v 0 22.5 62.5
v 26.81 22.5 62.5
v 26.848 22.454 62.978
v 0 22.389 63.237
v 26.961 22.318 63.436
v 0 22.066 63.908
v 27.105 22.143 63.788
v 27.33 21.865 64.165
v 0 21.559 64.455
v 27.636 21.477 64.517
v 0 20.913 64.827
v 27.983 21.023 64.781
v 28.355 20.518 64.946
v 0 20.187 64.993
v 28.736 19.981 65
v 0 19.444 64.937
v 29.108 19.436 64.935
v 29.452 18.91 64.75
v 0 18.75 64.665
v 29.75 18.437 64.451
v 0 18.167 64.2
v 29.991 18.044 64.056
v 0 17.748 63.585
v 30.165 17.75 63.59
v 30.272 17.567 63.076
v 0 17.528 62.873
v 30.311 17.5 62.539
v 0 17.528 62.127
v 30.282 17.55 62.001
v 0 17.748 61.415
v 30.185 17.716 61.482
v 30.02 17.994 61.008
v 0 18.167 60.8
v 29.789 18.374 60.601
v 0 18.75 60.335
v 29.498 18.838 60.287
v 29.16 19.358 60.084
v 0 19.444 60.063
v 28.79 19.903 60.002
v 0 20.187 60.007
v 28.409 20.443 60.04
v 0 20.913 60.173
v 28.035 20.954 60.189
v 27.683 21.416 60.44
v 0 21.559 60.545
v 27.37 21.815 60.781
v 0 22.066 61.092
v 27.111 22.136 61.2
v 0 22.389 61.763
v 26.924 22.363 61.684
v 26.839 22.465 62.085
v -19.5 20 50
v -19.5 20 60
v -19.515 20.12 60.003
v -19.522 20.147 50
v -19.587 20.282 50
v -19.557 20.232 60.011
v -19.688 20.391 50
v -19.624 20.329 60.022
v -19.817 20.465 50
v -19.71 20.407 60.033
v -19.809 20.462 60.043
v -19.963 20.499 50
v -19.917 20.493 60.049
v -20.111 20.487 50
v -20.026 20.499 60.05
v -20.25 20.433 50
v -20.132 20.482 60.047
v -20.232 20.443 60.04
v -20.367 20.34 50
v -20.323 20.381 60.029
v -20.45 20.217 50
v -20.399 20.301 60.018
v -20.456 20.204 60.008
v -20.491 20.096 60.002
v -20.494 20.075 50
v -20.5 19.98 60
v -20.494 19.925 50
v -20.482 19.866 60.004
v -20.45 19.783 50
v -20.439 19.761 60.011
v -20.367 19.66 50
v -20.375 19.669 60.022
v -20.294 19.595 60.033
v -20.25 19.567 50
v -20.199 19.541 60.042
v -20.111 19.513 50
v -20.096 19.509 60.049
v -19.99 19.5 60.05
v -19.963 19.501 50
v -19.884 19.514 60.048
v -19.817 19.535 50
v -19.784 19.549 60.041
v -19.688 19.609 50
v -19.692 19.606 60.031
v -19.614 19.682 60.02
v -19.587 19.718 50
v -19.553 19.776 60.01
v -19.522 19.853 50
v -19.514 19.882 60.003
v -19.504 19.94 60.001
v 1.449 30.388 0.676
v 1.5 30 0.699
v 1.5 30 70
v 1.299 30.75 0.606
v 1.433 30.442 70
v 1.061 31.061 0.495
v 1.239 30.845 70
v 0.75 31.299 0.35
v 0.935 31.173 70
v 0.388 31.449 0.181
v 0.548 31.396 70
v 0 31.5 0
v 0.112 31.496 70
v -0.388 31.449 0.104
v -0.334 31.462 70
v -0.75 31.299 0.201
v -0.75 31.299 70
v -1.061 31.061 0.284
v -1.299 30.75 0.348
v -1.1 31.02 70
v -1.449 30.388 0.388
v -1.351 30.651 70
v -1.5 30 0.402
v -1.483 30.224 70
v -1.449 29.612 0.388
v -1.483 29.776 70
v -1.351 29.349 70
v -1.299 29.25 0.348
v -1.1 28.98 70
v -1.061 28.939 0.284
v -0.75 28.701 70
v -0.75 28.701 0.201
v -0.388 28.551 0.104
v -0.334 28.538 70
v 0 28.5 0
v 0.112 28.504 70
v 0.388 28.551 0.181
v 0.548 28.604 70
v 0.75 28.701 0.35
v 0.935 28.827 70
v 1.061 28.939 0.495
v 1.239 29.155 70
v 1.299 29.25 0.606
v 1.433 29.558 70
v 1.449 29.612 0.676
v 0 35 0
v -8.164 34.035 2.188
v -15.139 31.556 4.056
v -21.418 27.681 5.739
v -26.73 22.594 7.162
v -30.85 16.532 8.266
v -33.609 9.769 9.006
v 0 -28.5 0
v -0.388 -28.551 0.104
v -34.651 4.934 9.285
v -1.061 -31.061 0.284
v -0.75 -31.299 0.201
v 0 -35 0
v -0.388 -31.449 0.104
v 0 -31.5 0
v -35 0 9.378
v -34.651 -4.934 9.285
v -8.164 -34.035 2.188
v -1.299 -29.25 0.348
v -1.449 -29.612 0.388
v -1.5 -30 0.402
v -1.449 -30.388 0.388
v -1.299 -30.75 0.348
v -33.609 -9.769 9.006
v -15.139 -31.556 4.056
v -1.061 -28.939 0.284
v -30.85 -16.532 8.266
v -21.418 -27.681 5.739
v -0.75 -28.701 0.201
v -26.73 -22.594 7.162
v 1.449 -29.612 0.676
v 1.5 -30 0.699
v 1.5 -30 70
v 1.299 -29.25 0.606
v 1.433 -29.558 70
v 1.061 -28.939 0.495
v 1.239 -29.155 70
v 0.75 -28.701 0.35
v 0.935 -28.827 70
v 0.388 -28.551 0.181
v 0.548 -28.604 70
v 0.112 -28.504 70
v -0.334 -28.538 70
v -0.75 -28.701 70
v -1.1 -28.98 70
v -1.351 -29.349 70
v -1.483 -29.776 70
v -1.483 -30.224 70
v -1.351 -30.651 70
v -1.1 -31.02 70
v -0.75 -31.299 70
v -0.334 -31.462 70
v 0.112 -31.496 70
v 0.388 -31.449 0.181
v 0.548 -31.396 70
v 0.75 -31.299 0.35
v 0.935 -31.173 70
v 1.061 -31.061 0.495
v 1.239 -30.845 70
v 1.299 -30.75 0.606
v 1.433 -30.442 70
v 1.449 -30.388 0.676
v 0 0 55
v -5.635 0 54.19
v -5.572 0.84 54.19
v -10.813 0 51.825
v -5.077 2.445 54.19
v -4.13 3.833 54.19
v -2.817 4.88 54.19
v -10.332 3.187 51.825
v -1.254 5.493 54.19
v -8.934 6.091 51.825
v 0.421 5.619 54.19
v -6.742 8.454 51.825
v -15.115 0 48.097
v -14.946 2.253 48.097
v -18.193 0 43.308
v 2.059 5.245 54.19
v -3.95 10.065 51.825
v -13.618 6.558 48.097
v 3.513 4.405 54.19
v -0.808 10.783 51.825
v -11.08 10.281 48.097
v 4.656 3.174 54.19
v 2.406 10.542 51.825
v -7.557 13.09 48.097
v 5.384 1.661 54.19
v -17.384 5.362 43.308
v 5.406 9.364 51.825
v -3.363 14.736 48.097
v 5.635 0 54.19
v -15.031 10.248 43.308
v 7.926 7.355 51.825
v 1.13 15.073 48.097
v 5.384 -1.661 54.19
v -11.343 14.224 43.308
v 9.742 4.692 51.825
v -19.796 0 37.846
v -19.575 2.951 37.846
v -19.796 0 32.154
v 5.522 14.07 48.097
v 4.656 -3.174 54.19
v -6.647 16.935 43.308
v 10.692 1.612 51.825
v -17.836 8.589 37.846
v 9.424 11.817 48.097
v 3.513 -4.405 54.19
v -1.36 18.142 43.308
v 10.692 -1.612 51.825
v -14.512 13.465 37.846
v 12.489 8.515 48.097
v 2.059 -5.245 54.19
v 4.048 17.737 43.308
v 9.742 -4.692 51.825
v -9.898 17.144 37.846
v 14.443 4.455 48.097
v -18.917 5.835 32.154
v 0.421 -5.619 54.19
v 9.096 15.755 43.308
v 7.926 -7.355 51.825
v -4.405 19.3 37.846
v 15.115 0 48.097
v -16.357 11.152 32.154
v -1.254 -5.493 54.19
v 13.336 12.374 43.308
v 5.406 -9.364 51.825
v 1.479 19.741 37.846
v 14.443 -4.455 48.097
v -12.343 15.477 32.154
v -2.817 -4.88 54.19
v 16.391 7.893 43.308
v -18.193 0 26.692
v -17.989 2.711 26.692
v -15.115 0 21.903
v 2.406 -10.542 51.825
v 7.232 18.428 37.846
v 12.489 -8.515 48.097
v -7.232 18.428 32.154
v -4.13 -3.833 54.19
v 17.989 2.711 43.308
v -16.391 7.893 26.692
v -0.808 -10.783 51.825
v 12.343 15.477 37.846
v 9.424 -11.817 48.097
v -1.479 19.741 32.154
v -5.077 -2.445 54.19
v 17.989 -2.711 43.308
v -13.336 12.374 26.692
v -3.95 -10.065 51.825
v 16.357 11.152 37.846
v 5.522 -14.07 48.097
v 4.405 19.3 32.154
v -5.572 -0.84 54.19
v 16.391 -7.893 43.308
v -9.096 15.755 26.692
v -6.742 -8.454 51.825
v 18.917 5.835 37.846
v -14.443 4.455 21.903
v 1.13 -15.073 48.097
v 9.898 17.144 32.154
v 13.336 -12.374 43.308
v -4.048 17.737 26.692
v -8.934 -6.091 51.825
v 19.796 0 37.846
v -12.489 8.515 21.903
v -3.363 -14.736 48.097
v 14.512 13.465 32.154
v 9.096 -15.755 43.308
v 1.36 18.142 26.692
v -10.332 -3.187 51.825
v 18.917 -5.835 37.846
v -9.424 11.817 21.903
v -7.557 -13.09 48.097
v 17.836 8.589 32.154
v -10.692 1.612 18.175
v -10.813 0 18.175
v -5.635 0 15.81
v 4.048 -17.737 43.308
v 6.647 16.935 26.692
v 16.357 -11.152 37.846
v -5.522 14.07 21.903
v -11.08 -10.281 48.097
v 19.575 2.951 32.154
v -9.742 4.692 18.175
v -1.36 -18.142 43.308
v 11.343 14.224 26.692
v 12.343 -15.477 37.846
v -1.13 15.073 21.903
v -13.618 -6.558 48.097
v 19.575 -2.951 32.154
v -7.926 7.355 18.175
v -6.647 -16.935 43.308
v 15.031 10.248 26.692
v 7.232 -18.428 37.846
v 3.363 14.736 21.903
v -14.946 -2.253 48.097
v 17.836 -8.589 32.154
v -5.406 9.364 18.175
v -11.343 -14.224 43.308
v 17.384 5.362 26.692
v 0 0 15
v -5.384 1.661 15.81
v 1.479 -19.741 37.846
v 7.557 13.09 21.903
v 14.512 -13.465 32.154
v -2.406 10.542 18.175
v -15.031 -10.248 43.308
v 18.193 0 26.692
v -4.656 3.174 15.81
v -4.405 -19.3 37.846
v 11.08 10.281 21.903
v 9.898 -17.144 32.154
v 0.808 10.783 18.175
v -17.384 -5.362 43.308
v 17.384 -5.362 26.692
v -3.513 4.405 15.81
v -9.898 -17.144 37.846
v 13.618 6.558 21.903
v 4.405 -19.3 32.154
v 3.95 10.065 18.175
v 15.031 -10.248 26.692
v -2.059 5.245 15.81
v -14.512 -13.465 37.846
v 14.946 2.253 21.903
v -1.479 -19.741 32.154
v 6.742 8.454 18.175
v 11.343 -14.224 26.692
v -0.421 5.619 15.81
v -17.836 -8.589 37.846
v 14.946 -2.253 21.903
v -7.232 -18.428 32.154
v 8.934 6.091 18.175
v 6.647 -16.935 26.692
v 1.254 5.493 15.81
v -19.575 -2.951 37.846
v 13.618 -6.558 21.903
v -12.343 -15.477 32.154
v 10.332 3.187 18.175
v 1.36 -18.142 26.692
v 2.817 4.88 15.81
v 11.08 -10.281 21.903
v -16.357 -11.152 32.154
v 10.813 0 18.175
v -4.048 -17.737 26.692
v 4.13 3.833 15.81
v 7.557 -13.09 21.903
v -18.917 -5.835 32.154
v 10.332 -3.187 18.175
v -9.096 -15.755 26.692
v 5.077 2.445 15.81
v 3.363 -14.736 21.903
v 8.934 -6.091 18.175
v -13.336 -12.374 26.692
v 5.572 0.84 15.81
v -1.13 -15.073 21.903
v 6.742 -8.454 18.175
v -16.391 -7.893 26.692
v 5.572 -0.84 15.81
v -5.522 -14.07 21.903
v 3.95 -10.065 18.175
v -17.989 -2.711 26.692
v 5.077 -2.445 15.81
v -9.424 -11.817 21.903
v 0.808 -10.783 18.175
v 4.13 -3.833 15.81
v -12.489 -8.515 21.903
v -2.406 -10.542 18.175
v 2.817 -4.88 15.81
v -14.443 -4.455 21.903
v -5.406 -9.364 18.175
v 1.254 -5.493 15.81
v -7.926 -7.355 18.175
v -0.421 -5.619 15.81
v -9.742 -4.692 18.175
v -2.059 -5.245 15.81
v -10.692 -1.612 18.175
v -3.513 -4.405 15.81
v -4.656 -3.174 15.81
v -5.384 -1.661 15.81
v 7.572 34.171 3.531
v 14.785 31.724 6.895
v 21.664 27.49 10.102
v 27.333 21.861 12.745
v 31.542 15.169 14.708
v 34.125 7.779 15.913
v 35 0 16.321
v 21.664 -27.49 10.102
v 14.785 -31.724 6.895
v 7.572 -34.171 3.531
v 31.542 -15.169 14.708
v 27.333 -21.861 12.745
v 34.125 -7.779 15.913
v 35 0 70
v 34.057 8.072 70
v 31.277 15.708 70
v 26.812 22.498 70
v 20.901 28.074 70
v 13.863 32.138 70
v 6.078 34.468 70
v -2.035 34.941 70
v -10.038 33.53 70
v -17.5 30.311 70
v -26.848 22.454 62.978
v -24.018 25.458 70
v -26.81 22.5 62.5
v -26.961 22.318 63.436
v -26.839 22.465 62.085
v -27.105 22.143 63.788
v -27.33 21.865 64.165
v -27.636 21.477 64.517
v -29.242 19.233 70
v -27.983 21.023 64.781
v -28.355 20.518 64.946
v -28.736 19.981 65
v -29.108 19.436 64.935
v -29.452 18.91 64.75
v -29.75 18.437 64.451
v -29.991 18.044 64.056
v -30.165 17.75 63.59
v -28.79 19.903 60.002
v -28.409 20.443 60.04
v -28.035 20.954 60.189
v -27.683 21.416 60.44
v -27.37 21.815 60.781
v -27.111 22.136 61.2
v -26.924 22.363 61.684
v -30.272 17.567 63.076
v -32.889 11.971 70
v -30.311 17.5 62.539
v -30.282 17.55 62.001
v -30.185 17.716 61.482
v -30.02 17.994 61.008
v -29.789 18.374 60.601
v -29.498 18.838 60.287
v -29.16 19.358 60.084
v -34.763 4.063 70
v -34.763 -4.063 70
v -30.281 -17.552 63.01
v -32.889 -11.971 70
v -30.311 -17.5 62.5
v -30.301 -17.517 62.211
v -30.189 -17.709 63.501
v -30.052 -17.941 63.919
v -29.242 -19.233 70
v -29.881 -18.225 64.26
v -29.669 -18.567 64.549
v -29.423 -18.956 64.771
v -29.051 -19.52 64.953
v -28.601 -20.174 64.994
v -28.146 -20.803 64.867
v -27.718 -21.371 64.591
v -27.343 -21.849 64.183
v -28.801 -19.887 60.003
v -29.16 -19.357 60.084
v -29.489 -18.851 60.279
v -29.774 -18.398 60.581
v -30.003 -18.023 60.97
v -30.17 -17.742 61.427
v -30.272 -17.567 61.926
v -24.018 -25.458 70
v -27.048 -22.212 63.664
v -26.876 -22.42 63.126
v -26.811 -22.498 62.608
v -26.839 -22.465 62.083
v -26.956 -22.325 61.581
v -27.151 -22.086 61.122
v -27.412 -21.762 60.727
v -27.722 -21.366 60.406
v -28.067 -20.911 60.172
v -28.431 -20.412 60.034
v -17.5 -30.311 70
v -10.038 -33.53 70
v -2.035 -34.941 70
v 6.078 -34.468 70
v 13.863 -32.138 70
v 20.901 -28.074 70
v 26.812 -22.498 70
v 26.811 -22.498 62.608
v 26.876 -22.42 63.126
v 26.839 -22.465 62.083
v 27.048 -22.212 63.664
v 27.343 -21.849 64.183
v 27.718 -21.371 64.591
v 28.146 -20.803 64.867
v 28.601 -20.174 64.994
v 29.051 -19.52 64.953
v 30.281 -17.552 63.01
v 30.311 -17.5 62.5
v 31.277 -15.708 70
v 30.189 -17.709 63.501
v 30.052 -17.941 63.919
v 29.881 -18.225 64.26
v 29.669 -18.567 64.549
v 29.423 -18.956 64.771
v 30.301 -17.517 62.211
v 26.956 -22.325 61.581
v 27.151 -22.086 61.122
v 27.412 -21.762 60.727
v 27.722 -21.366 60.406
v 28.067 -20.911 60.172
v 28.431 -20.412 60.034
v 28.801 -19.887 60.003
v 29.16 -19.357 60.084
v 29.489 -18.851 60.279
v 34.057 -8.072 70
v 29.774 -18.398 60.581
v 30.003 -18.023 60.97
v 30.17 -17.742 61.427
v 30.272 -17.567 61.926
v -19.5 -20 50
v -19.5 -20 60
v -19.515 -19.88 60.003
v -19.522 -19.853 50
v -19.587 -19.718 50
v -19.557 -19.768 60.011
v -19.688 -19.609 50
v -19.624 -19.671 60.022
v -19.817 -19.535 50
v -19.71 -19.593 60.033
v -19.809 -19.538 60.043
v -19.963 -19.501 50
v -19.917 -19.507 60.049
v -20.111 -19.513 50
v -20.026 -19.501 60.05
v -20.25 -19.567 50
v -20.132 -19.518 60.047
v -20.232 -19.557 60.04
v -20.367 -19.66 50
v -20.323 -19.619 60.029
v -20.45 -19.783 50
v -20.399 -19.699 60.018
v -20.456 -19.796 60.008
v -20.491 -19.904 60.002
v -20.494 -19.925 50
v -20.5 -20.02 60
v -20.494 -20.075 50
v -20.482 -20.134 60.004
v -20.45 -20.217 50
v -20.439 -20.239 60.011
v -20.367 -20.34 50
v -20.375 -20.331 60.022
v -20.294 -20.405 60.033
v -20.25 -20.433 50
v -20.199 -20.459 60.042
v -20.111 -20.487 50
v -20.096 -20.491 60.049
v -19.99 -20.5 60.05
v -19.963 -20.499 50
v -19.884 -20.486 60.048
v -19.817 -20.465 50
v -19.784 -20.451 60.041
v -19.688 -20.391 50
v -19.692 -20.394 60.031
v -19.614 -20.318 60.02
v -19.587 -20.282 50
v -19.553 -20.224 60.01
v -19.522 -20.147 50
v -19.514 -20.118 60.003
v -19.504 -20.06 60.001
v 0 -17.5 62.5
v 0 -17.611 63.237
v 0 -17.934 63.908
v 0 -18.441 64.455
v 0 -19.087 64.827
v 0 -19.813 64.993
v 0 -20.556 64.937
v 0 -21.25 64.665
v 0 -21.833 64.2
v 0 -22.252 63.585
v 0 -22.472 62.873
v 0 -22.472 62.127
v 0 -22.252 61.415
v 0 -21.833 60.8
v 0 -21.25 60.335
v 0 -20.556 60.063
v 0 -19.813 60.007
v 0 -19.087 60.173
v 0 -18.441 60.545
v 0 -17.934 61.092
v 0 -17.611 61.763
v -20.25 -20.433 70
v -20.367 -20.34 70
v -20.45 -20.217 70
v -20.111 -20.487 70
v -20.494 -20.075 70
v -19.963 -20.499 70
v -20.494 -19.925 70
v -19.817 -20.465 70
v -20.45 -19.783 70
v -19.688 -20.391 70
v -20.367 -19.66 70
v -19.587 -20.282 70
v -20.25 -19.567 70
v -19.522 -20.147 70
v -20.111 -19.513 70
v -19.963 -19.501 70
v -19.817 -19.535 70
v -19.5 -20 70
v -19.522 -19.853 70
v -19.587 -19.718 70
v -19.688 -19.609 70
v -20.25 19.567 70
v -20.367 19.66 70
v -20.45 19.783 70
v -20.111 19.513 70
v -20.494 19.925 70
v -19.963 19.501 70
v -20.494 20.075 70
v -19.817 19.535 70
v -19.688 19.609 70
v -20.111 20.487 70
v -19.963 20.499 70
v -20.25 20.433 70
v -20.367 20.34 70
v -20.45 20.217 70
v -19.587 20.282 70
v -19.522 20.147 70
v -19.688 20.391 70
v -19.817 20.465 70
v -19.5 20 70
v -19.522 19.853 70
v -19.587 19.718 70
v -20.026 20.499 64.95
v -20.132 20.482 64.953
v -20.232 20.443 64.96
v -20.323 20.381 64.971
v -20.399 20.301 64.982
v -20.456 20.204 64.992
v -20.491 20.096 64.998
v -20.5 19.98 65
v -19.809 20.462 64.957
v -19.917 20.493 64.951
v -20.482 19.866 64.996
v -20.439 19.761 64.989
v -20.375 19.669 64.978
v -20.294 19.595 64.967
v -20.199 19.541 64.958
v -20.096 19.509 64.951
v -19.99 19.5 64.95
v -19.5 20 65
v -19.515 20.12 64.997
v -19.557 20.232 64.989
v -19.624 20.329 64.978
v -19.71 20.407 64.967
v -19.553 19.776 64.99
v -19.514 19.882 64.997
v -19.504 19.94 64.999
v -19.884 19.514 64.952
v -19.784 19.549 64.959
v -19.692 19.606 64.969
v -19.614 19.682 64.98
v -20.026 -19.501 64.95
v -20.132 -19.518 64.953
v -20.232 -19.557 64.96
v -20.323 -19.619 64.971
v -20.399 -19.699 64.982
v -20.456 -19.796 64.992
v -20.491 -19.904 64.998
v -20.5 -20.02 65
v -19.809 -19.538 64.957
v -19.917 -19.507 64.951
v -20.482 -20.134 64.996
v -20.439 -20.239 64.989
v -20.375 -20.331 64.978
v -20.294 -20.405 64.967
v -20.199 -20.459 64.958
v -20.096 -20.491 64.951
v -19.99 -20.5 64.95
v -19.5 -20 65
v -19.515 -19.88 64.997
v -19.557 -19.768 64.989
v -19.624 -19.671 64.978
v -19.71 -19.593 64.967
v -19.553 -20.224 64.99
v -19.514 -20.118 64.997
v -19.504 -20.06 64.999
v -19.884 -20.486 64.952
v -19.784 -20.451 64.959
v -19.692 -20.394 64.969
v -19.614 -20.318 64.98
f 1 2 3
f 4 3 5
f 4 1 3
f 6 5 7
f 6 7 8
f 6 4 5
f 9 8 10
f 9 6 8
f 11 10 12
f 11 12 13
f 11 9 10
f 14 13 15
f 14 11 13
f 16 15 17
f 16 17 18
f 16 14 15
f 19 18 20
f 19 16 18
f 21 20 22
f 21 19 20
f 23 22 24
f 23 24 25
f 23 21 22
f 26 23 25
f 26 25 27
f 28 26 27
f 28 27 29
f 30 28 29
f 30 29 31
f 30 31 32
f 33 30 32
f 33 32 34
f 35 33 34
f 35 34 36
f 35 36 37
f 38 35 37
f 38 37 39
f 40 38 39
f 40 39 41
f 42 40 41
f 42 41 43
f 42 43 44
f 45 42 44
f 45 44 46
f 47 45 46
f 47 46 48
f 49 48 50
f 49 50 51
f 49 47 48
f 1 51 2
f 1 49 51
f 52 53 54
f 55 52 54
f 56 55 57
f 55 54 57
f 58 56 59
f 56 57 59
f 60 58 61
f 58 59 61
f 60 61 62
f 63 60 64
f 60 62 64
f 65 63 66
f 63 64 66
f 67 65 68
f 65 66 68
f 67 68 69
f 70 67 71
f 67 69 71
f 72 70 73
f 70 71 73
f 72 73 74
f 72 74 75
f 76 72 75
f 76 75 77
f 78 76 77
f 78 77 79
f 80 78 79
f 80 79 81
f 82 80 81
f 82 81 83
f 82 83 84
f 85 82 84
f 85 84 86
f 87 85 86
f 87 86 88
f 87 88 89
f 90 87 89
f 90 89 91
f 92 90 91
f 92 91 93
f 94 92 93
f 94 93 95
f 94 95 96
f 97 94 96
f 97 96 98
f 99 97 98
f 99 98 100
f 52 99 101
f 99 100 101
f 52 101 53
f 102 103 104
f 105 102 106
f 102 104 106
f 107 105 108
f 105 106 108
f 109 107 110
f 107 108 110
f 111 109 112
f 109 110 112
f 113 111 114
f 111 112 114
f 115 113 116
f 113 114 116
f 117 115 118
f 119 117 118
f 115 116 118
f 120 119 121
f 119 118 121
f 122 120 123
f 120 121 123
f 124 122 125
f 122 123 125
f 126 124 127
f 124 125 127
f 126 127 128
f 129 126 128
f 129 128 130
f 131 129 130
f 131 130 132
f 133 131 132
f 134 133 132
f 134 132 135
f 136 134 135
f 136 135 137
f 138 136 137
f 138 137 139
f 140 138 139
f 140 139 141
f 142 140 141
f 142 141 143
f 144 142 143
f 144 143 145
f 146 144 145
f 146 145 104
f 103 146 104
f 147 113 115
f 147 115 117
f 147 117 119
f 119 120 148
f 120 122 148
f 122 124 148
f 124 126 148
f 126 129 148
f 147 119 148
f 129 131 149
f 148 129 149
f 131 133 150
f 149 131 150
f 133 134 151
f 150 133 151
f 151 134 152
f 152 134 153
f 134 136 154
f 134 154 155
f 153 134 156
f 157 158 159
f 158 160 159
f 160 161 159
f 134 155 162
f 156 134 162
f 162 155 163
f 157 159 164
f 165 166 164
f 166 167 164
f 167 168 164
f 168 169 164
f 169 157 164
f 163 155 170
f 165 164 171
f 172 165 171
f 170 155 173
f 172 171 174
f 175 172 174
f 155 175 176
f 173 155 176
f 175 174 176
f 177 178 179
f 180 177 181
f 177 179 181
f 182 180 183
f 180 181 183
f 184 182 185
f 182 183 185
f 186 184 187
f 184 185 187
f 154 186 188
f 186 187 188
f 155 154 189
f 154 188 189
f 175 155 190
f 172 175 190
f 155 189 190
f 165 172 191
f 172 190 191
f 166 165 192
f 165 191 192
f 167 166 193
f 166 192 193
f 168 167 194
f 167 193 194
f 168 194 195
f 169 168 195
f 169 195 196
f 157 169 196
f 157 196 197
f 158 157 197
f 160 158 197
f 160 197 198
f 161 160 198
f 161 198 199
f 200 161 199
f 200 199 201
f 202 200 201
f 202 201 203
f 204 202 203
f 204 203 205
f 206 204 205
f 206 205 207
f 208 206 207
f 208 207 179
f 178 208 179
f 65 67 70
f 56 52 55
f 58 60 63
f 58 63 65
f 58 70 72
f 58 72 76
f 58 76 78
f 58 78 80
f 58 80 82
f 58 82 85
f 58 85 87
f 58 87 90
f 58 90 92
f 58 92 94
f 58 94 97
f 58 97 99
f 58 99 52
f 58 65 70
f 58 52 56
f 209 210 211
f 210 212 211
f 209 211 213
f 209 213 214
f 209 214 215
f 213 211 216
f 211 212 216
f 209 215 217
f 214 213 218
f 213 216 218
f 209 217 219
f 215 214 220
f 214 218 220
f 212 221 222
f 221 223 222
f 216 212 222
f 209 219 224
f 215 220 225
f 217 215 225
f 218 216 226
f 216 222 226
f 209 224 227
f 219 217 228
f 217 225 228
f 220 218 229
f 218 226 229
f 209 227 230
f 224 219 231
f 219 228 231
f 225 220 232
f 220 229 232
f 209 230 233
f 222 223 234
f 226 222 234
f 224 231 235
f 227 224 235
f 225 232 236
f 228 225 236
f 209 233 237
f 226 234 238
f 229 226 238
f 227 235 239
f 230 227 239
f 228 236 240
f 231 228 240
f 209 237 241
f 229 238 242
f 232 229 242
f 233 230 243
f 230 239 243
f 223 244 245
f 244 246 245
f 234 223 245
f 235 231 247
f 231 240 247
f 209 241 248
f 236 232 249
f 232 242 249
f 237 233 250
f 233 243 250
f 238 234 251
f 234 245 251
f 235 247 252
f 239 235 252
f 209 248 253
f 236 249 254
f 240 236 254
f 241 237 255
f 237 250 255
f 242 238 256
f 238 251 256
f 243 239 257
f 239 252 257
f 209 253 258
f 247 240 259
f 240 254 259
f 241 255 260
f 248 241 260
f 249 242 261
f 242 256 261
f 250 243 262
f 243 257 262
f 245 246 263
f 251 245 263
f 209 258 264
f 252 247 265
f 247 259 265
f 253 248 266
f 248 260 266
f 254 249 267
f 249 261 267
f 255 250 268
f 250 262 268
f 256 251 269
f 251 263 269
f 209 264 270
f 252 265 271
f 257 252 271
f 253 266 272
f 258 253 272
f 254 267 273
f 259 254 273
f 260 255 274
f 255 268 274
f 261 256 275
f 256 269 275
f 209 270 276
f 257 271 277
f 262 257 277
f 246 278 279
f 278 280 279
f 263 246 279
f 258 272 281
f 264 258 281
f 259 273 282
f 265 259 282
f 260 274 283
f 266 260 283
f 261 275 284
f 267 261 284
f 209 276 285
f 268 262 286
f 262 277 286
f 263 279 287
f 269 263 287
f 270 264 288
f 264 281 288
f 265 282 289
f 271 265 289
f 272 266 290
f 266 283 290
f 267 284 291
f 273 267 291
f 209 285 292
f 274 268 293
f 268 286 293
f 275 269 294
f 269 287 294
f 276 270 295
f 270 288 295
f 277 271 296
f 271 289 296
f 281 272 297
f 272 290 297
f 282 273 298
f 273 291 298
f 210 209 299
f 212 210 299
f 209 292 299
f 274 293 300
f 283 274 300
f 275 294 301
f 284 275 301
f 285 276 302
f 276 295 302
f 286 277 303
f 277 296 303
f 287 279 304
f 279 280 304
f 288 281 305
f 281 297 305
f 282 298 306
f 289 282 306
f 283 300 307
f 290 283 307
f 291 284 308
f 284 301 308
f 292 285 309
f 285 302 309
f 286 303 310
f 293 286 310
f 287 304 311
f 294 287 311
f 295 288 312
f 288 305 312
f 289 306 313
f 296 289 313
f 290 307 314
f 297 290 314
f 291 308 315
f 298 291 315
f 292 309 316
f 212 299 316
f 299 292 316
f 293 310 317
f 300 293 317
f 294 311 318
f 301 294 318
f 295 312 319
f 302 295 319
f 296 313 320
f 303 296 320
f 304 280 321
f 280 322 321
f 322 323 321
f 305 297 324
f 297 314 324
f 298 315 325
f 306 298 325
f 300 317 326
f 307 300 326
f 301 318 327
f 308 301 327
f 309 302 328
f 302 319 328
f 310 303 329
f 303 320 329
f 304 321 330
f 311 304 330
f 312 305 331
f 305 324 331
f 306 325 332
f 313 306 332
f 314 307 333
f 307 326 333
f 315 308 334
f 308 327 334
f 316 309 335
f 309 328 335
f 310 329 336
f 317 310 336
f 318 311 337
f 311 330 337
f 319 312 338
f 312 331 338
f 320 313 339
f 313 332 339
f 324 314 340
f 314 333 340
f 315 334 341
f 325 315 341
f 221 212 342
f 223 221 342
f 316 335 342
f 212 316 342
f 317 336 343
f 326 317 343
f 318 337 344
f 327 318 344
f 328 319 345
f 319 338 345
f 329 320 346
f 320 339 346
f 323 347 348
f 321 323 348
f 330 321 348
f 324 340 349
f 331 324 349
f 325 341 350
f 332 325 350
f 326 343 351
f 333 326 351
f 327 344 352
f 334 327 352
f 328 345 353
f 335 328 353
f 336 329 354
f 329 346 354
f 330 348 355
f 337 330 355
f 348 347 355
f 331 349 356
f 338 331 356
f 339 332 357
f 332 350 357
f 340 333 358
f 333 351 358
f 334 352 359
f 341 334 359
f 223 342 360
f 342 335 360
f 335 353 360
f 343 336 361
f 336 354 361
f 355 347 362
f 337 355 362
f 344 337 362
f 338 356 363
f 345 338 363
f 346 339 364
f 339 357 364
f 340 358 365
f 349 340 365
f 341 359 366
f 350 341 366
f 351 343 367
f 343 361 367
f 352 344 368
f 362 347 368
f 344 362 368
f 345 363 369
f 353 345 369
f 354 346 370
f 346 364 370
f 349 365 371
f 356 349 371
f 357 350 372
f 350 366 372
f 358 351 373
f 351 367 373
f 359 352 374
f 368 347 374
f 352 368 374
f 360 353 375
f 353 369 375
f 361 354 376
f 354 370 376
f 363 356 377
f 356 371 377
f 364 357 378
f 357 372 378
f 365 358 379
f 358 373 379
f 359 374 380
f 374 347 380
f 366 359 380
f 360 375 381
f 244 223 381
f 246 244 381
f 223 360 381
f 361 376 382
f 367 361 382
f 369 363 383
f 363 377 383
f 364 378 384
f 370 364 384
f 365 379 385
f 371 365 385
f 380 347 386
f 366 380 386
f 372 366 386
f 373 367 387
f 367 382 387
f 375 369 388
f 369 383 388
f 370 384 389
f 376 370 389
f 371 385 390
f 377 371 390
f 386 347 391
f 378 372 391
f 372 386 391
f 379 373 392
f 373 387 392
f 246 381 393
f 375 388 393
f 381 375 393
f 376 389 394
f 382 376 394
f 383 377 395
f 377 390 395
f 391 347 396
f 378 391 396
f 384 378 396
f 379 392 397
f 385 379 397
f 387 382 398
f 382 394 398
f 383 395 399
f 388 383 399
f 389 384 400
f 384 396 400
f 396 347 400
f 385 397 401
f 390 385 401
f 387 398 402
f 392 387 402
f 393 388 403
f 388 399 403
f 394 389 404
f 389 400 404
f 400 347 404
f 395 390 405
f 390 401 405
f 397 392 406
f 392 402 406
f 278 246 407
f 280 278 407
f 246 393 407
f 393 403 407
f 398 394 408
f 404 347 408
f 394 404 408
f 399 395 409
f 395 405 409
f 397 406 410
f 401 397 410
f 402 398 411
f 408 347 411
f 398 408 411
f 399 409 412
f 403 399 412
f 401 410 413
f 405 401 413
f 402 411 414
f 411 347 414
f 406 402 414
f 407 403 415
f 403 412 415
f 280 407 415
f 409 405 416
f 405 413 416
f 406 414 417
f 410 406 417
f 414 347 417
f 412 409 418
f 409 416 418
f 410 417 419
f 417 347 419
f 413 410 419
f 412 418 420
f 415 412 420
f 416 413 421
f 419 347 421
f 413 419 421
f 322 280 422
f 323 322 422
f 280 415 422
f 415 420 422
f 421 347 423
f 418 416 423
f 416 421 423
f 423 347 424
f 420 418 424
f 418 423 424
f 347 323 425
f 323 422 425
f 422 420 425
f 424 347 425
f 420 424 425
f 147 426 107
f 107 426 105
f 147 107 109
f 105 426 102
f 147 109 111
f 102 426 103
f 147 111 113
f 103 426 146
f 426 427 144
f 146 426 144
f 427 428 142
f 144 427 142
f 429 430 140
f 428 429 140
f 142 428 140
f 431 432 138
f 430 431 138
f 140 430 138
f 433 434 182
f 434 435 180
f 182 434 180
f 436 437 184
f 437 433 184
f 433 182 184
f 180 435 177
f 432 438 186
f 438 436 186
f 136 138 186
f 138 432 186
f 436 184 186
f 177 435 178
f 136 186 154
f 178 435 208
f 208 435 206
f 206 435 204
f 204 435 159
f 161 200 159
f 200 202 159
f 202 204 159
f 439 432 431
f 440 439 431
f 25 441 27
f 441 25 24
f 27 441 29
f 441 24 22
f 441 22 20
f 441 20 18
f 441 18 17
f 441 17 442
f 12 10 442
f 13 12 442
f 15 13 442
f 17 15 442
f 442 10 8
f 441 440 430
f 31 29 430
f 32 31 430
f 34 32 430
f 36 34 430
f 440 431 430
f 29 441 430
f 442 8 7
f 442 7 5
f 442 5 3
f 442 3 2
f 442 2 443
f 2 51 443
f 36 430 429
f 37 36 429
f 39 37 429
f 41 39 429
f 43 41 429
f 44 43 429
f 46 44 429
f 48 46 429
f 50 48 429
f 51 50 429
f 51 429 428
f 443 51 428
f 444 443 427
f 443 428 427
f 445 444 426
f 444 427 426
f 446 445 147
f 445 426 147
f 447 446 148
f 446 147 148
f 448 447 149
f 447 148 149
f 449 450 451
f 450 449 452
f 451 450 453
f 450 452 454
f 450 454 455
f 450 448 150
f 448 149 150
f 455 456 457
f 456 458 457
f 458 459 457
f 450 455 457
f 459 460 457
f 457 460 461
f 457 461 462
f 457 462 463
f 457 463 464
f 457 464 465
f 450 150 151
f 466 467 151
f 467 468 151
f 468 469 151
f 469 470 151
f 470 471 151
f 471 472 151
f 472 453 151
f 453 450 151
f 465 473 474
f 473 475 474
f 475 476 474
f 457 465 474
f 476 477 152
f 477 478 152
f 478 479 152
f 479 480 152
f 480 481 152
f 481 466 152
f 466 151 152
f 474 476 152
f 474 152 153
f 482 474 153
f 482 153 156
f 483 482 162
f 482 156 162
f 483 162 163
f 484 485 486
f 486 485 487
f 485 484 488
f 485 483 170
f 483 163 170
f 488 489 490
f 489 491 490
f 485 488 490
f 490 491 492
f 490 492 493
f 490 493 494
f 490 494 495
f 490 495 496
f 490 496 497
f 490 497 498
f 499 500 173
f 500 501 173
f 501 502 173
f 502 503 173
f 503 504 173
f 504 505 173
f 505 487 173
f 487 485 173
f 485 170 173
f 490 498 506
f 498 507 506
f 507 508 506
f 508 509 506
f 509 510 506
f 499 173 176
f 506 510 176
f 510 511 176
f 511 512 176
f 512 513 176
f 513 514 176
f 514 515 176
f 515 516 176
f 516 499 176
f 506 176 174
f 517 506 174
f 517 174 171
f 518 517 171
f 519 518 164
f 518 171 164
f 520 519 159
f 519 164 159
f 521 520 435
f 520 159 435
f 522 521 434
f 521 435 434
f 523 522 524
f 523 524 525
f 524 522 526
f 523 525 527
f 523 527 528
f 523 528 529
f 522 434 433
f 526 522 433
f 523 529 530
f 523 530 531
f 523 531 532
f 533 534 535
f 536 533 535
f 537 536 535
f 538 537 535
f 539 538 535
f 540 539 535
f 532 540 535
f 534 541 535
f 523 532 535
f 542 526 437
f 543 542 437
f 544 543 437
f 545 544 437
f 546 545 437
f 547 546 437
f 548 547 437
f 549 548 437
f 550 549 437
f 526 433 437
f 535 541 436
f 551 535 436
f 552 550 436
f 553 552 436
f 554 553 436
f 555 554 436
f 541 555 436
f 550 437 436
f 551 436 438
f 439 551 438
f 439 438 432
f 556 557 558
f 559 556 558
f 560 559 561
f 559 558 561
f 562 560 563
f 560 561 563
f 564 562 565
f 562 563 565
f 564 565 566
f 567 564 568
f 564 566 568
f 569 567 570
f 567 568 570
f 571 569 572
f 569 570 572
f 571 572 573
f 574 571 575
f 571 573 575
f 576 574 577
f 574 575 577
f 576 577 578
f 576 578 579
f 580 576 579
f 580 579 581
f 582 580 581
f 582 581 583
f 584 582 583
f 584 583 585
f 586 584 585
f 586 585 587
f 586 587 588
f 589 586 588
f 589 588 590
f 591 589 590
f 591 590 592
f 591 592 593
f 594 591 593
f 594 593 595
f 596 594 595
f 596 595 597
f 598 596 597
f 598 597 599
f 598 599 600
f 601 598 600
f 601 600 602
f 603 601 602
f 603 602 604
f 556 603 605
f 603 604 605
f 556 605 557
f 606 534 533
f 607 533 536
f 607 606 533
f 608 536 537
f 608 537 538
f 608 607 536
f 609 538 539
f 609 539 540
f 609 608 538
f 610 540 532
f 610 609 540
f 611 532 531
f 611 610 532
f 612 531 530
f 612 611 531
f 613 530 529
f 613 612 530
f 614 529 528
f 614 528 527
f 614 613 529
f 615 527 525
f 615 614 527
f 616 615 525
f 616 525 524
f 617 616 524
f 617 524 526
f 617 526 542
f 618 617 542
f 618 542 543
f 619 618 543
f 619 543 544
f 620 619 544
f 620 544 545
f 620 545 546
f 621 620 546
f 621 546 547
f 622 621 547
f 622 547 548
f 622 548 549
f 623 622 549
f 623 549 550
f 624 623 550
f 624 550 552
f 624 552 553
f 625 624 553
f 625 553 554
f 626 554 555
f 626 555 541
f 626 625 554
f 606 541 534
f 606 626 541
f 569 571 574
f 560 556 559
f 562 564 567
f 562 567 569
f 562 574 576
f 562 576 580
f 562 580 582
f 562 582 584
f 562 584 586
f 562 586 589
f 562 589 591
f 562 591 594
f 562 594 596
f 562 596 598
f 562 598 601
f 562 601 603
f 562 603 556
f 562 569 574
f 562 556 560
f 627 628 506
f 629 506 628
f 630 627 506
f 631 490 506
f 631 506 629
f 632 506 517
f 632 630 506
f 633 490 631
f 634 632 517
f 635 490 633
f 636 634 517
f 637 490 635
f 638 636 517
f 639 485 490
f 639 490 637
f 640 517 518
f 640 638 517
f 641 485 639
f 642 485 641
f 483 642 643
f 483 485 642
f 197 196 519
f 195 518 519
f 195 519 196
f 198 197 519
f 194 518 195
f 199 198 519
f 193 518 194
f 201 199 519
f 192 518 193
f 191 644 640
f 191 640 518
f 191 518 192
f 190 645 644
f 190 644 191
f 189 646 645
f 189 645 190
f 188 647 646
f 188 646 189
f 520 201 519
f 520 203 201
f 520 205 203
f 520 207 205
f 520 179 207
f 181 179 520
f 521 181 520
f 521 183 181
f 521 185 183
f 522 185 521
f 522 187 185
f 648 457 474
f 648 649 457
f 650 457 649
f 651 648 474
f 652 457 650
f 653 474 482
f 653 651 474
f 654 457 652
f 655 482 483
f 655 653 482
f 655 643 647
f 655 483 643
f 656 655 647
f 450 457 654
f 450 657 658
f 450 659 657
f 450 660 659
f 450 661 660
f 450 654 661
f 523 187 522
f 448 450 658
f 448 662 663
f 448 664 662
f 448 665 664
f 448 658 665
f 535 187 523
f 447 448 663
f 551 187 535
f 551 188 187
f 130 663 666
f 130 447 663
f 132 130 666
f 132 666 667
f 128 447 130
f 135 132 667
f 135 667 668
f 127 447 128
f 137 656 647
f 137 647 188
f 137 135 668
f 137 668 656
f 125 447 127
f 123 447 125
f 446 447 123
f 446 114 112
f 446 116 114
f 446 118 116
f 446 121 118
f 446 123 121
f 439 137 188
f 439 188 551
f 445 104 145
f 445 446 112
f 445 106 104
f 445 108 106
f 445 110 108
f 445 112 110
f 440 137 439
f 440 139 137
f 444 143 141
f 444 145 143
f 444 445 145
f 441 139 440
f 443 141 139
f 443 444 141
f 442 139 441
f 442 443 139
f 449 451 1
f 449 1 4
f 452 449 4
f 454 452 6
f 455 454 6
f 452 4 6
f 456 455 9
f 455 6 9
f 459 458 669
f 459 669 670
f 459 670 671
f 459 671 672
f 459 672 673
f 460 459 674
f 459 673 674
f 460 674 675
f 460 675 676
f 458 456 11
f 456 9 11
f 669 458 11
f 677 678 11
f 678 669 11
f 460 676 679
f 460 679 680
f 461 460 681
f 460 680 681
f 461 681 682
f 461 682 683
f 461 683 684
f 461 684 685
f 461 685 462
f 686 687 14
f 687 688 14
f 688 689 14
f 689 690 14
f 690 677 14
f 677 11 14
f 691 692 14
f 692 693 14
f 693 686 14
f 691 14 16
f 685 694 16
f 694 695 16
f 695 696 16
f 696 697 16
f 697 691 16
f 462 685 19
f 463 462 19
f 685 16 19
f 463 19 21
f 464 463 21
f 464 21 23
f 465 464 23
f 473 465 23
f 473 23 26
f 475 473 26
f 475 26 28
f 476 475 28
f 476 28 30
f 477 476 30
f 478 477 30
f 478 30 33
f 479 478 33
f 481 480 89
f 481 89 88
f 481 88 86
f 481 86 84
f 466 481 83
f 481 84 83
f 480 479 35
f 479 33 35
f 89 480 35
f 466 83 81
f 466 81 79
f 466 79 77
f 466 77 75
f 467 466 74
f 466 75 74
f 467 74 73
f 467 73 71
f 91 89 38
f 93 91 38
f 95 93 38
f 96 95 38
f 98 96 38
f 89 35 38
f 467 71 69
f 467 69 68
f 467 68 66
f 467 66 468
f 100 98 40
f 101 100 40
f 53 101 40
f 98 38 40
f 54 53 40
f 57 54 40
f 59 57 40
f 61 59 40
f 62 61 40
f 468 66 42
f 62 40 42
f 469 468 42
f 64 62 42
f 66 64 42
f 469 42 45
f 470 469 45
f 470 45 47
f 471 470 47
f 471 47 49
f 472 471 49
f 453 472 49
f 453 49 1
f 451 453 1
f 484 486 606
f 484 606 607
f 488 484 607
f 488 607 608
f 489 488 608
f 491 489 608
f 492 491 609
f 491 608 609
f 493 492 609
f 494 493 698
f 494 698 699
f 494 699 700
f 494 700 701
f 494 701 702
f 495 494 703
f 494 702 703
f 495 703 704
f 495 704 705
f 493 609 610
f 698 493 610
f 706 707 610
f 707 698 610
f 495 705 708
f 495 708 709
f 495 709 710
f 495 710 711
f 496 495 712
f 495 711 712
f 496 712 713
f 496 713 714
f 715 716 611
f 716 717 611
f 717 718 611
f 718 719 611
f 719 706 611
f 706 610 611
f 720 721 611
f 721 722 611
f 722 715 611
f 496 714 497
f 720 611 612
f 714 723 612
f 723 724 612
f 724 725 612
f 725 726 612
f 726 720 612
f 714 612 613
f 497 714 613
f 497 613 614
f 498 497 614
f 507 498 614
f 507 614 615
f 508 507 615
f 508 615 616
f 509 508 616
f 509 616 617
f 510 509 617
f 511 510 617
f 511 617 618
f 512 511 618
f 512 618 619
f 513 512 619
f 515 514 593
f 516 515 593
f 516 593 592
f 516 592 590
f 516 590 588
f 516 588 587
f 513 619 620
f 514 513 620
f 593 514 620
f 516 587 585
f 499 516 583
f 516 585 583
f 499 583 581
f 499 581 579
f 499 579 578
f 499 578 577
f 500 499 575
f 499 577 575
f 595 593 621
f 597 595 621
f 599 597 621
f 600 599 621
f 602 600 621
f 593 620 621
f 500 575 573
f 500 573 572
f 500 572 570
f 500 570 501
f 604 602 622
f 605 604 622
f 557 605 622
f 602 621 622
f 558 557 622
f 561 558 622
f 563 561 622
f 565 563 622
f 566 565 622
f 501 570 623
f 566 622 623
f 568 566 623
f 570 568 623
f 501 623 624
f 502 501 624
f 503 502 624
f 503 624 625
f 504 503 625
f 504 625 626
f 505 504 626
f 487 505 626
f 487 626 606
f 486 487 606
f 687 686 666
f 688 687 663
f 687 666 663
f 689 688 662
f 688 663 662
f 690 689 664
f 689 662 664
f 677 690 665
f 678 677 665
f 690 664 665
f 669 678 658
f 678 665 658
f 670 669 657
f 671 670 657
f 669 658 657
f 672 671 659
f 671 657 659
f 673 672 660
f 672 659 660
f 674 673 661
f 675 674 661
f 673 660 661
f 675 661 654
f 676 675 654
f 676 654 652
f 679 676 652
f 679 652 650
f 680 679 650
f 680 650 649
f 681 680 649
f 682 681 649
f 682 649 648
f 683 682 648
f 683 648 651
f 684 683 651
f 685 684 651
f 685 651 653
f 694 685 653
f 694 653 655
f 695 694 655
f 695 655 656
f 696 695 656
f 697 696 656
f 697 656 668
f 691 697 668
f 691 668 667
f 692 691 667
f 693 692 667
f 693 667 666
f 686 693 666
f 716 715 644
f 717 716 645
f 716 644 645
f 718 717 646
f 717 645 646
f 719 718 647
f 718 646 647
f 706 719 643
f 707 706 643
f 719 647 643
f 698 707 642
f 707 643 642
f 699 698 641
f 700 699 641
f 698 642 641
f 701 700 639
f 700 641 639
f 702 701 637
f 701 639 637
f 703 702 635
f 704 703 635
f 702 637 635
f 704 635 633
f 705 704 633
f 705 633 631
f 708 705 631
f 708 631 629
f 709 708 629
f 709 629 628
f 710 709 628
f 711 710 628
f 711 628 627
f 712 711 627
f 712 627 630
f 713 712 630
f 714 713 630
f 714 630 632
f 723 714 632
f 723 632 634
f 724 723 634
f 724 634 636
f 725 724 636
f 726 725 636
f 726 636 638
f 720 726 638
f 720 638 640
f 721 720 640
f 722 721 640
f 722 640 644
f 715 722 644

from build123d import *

# Parameters (mm, degrees)
F0_R          = 35
F1_DEPTH      = 70
F3_DEPTH      = 35.001
F3_DEPTH_BACK = 35.001
F4_R          = 2.5
F5_DEPTH      = 35.001
F5_DEPTH_BACK = 35.001
F8_R          = 0.5
F9_DEPTH      = 20
F10_R         = 1.5
F11_DEPTH     = 70.0010001


with BuildPart() as f1:
    # F0 (on Top) → F1 (new body)
    with BuildSketch(Plane.XY):
        Circle(F0_R)
    extrude(amount=F1_DEPTH)

    # F2 (on Front) → F3 (cut, two sides)
    with BuildSketch(Plane.XZ) as f3_sk:
        Polygon((-50, 0), (0, 0), (-50, 13.3974596216), align=None)
        Polygon((50, 23.3153829077), (0, 0), (50, 0), align=None)
    extrude(amount=-F3_DEPTH, mode=Mode.SUBTRACT)
    extrude(f3_sk.sketch, amount=F3_DEPTH_BACK, mode=Mode.SUBTRACT)

    # F4 (on Right) → F5 (cut, two sides)
    with BuildSketch(Plane.YZ) as f5_sk:
        with Locations((-20, 62.5)):
            Circle(F4_R)
        with Locations((20, 62.5)):
            Circle(F4_R)
    extrude(amount=-F5_DEPTH, mode=Mode.SUBTRACT)
    extrude(f5_sk.sketch, amount=F5_DEPTH_BACK, mode=Mode.SUBTRACT)

    # F6 (on Front) → F7 (revolve, cut)
    with BuildSketch(Plane.XZ):
        with BuildLine():
            Line((0, 15), (0, 55))
            ThreePointArc((0, 55), (-20, 35), (0, 15))
        make_face()
    revolve(axis=Axis((0, 0, 35), (0, 0, -1)), mode=Mode.SUBTRACT)

    # F8 (on face) → F9 (cut)
    with BuildSketch(Plane.XY.offset(70)):
        with Locations((-20, 20)):
            Circle(F8_R)
        with Locations((-20, -20)):
            Circle(F8_R)
    extrude(amount=-F9_DEPTH, mode=Mode.SUBTRACT)

    # F10 (on face) → F11 (cut, through all)
    with BuildSketch(Plane.XY.offset(70)):
        with Locations((0, 30)):
            Circle(F10_R)
        with Locations((0, -30)):
            Circle(F10_R)
    extrude(amount=-F11_DEPTH, mode=Mode.SUBTRACT)


solid = f1.part
